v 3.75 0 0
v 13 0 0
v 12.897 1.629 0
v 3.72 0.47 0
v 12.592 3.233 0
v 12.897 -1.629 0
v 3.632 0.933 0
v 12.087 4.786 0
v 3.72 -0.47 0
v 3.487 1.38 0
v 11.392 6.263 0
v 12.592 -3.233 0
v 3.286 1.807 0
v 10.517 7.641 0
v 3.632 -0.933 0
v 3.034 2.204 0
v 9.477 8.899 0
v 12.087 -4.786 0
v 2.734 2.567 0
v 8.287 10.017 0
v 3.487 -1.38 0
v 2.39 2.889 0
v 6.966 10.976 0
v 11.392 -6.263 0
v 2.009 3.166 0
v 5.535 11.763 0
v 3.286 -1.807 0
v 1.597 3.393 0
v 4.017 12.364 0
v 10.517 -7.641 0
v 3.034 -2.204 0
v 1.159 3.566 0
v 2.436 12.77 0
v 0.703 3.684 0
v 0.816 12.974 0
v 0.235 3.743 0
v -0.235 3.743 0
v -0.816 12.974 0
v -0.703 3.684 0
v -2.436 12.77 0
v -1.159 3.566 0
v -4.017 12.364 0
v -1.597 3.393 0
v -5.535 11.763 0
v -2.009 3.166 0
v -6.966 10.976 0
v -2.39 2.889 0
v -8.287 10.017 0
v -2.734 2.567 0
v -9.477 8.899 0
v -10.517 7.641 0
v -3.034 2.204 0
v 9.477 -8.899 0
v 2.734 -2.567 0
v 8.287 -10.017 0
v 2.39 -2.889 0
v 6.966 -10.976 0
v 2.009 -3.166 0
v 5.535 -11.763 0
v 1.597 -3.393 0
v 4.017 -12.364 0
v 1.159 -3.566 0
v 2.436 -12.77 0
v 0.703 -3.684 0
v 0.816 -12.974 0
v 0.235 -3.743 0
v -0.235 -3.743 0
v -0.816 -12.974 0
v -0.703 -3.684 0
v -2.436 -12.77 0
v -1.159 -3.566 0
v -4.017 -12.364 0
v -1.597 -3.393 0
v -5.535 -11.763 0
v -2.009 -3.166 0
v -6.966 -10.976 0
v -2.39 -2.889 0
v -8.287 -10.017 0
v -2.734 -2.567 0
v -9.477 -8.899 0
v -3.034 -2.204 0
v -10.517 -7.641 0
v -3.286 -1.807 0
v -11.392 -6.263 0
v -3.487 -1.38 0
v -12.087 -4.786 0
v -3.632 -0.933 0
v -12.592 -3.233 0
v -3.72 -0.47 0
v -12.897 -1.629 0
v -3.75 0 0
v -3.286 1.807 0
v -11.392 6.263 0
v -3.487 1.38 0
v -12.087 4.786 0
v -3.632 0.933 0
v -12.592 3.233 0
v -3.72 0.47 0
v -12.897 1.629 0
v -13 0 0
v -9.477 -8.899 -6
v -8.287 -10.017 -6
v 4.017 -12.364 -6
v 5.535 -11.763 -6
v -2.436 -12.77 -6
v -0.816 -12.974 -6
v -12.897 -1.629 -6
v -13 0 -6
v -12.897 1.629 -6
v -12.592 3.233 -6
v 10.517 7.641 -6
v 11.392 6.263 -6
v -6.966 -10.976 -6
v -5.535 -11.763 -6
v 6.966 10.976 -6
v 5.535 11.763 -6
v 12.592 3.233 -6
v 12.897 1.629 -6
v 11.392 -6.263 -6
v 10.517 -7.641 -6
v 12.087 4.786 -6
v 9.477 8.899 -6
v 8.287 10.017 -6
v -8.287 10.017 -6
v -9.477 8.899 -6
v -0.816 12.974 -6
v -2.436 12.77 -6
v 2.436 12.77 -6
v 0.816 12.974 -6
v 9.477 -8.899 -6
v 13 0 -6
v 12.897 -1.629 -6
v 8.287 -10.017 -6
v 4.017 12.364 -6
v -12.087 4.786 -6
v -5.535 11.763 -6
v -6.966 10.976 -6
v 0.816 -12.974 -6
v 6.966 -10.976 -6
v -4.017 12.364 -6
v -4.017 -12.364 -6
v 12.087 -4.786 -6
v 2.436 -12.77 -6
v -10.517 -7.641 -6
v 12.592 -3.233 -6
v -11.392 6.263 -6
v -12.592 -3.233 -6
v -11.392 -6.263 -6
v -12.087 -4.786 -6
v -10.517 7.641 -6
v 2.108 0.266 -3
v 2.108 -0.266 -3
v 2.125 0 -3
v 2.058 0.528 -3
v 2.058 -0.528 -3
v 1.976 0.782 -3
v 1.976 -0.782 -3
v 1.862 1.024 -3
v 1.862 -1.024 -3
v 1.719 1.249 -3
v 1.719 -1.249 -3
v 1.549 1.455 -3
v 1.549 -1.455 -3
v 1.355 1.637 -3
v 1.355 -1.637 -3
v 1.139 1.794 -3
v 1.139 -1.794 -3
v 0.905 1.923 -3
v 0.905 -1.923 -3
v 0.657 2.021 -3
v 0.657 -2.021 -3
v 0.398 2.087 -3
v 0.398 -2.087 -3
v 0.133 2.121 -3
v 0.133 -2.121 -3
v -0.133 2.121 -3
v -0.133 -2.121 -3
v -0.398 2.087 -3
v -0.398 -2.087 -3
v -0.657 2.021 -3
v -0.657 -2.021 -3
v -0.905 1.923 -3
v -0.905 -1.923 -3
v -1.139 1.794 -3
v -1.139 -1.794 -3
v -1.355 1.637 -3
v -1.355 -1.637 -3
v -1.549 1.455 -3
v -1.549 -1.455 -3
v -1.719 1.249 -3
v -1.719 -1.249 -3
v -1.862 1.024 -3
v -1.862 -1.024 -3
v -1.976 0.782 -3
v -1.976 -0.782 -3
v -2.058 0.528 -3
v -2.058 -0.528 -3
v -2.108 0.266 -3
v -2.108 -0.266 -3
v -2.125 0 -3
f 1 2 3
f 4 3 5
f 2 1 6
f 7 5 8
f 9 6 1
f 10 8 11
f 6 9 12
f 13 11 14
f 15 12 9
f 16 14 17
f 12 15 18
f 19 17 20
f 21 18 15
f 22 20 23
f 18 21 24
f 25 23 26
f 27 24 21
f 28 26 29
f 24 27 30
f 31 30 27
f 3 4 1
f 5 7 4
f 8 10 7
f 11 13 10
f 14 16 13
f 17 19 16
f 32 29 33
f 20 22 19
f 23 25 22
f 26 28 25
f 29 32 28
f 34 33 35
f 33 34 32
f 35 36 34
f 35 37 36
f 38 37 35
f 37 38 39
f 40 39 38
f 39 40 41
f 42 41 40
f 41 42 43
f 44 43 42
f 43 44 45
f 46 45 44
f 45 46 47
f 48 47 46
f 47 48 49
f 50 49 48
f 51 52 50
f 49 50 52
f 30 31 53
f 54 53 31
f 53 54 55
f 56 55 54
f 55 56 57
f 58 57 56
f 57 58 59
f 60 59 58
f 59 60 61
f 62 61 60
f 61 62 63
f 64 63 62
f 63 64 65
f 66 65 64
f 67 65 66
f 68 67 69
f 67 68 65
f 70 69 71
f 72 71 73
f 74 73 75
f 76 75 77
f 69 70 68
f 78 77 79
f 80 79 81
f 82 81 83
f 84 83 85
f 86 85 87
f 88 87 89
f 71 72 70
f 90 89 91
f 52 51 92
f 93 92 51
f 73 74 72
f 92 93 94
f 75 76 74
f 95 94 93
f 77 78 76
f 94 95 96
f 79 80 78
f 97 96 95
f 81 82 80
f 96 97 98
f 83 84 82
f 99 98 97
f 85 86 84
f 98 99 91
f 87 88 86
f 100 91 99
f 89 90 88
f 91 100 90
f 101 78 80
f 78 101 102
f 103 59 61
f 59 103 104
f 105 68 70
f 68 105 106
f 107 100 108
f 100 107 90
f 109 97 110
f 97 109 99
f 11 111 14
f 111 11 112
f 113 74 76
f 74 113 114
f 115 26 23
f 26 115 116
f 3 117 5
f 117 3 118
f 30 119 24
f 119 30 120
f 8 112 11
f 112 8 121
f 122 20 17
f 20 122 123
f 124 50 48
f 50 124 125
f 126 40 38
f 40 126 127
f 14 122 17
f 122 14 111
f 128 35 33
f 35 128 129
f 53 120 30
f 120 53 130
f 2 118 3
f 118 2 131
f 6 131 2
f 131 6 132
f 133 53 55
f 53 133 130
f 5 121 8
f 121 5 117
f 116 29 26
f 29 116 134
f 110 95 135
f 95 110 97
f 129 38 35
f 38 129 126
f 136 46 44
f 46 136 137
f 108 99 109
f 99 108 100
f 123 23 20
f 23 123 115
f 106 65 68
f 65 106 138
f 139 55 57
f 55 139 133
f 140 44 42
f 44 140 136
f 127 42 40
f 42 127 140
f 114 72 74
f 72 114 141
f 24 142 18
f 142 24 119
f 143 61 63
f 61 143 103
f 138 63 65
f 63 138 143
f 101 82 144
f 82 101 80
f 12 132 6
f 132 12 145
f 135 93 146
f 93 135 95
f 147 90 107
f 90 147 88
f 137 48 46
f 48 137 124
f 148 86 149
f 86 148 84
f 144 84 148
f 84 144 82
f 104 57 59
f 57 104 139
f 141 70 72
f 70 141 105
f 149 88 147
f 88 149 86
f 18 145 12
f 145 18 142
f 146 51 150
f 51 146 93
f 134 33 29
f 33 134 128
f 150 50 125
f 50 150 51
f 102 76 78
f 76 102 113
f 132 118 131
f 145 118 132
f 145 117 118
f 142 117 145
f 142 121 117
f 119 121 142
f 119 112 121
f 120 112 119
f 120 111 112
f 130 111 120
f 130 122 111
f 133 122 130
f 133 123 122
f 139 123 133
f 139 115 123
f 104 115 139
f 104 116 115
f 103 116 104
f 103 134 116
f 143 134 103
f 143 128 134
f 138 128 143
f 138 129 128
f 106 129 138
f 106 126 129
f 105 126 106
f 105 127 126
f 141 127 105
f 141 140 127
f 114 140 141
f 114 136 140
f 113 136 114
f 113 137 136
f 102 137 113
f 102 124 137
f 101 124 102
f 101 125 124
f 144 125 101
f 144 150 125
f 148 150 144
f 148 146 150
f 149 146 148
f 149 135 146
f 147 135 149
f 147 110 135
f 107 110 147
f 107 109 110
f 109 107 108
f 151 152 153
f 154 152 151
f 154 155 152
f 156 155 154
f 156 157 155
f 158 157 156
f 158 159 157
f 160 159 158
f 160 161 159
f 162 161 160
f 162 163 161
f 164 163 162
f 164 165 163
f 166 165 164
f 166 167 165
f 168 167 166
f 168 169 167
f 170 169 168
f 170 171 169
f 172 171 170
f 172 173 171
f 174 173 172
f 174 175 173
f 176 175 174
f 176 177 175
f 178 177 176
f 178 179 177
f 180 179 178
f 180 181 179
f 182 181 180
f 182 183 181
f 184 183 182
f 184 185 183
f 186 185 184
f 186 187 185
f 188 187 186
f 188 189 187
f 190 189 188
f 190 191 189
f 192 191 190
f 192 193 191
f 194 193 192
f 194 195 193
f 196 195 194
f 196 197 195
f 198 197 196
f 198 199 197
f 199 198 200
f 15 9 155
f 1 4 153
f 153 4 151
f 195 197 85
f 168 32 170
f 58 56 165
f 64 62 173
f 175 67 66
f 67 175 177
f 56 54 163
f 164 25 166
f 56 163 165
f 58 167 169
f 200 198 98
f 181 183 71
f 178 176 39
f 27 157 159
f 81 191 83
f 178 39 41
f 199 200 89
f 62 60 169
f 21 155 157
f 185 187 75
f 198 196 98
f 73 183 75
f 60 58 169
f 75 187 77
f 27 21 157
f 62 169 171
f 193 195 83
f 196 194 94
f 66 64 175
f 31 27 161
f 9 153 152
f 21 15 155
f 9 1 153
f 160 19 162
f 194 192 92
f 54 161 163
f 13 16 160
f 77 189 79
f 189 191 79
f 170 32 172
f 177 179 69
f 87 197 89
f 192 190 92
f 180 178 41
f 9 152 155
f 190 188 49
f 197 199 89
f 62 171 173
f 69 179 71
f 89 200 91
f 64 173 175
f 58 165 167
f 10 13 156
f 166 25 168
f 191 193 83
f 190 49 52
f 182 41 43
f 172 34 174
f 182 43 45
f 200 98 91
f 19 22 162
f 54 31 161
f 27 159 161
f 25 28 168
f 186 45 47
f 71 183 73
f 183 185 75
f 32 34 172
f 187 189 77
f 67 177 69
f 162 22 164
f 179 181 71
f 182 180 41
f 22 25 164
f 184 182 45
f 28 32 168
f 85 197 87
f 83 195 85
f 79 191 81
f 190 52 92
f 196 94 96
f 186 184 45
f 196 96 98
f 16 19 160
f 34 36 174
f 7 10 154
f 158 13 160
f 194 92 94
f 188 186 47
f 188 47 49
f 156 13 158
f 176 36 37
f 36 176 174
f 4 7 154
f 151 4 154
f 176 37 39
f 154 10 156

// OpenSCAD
$fn = 50;


difference() {
	union() {
		translate(v = [0, 0, -3.0000000000]) {
			cylinder(h = 3, r = 7.0000000000);
		}
		translate(v = [0, 0, -6.0000000000]) {
			cylinder(h = 6, r = 13.0000000000);
		}
	}
	union() {
		translate(v = [0, 0, 0]) {
			rotate(a = [0, 0, 0]) {
				difference() {
					union() {
						#translate(v = [0, 0, -3.0000000000]) {
							cylinder(h = 3, r = 2.0000000000);
						}
						#translate(v = [0, 0, -3]) {
							cylinder(h = 3, r1 = 2.1250000000, r2 = 3.7500000000);
						}
						#translate(v = [0, 0, -3.0000000000]) {
							cylinder(h = 3, r = 2.1250000000);
						}
						#translate(v = [0, 0, -3.0000000000]) {
							cylinder(h = 3, r = 2.0000000000);
						}
					}
					union();
				}
			}
		}
	}
}
